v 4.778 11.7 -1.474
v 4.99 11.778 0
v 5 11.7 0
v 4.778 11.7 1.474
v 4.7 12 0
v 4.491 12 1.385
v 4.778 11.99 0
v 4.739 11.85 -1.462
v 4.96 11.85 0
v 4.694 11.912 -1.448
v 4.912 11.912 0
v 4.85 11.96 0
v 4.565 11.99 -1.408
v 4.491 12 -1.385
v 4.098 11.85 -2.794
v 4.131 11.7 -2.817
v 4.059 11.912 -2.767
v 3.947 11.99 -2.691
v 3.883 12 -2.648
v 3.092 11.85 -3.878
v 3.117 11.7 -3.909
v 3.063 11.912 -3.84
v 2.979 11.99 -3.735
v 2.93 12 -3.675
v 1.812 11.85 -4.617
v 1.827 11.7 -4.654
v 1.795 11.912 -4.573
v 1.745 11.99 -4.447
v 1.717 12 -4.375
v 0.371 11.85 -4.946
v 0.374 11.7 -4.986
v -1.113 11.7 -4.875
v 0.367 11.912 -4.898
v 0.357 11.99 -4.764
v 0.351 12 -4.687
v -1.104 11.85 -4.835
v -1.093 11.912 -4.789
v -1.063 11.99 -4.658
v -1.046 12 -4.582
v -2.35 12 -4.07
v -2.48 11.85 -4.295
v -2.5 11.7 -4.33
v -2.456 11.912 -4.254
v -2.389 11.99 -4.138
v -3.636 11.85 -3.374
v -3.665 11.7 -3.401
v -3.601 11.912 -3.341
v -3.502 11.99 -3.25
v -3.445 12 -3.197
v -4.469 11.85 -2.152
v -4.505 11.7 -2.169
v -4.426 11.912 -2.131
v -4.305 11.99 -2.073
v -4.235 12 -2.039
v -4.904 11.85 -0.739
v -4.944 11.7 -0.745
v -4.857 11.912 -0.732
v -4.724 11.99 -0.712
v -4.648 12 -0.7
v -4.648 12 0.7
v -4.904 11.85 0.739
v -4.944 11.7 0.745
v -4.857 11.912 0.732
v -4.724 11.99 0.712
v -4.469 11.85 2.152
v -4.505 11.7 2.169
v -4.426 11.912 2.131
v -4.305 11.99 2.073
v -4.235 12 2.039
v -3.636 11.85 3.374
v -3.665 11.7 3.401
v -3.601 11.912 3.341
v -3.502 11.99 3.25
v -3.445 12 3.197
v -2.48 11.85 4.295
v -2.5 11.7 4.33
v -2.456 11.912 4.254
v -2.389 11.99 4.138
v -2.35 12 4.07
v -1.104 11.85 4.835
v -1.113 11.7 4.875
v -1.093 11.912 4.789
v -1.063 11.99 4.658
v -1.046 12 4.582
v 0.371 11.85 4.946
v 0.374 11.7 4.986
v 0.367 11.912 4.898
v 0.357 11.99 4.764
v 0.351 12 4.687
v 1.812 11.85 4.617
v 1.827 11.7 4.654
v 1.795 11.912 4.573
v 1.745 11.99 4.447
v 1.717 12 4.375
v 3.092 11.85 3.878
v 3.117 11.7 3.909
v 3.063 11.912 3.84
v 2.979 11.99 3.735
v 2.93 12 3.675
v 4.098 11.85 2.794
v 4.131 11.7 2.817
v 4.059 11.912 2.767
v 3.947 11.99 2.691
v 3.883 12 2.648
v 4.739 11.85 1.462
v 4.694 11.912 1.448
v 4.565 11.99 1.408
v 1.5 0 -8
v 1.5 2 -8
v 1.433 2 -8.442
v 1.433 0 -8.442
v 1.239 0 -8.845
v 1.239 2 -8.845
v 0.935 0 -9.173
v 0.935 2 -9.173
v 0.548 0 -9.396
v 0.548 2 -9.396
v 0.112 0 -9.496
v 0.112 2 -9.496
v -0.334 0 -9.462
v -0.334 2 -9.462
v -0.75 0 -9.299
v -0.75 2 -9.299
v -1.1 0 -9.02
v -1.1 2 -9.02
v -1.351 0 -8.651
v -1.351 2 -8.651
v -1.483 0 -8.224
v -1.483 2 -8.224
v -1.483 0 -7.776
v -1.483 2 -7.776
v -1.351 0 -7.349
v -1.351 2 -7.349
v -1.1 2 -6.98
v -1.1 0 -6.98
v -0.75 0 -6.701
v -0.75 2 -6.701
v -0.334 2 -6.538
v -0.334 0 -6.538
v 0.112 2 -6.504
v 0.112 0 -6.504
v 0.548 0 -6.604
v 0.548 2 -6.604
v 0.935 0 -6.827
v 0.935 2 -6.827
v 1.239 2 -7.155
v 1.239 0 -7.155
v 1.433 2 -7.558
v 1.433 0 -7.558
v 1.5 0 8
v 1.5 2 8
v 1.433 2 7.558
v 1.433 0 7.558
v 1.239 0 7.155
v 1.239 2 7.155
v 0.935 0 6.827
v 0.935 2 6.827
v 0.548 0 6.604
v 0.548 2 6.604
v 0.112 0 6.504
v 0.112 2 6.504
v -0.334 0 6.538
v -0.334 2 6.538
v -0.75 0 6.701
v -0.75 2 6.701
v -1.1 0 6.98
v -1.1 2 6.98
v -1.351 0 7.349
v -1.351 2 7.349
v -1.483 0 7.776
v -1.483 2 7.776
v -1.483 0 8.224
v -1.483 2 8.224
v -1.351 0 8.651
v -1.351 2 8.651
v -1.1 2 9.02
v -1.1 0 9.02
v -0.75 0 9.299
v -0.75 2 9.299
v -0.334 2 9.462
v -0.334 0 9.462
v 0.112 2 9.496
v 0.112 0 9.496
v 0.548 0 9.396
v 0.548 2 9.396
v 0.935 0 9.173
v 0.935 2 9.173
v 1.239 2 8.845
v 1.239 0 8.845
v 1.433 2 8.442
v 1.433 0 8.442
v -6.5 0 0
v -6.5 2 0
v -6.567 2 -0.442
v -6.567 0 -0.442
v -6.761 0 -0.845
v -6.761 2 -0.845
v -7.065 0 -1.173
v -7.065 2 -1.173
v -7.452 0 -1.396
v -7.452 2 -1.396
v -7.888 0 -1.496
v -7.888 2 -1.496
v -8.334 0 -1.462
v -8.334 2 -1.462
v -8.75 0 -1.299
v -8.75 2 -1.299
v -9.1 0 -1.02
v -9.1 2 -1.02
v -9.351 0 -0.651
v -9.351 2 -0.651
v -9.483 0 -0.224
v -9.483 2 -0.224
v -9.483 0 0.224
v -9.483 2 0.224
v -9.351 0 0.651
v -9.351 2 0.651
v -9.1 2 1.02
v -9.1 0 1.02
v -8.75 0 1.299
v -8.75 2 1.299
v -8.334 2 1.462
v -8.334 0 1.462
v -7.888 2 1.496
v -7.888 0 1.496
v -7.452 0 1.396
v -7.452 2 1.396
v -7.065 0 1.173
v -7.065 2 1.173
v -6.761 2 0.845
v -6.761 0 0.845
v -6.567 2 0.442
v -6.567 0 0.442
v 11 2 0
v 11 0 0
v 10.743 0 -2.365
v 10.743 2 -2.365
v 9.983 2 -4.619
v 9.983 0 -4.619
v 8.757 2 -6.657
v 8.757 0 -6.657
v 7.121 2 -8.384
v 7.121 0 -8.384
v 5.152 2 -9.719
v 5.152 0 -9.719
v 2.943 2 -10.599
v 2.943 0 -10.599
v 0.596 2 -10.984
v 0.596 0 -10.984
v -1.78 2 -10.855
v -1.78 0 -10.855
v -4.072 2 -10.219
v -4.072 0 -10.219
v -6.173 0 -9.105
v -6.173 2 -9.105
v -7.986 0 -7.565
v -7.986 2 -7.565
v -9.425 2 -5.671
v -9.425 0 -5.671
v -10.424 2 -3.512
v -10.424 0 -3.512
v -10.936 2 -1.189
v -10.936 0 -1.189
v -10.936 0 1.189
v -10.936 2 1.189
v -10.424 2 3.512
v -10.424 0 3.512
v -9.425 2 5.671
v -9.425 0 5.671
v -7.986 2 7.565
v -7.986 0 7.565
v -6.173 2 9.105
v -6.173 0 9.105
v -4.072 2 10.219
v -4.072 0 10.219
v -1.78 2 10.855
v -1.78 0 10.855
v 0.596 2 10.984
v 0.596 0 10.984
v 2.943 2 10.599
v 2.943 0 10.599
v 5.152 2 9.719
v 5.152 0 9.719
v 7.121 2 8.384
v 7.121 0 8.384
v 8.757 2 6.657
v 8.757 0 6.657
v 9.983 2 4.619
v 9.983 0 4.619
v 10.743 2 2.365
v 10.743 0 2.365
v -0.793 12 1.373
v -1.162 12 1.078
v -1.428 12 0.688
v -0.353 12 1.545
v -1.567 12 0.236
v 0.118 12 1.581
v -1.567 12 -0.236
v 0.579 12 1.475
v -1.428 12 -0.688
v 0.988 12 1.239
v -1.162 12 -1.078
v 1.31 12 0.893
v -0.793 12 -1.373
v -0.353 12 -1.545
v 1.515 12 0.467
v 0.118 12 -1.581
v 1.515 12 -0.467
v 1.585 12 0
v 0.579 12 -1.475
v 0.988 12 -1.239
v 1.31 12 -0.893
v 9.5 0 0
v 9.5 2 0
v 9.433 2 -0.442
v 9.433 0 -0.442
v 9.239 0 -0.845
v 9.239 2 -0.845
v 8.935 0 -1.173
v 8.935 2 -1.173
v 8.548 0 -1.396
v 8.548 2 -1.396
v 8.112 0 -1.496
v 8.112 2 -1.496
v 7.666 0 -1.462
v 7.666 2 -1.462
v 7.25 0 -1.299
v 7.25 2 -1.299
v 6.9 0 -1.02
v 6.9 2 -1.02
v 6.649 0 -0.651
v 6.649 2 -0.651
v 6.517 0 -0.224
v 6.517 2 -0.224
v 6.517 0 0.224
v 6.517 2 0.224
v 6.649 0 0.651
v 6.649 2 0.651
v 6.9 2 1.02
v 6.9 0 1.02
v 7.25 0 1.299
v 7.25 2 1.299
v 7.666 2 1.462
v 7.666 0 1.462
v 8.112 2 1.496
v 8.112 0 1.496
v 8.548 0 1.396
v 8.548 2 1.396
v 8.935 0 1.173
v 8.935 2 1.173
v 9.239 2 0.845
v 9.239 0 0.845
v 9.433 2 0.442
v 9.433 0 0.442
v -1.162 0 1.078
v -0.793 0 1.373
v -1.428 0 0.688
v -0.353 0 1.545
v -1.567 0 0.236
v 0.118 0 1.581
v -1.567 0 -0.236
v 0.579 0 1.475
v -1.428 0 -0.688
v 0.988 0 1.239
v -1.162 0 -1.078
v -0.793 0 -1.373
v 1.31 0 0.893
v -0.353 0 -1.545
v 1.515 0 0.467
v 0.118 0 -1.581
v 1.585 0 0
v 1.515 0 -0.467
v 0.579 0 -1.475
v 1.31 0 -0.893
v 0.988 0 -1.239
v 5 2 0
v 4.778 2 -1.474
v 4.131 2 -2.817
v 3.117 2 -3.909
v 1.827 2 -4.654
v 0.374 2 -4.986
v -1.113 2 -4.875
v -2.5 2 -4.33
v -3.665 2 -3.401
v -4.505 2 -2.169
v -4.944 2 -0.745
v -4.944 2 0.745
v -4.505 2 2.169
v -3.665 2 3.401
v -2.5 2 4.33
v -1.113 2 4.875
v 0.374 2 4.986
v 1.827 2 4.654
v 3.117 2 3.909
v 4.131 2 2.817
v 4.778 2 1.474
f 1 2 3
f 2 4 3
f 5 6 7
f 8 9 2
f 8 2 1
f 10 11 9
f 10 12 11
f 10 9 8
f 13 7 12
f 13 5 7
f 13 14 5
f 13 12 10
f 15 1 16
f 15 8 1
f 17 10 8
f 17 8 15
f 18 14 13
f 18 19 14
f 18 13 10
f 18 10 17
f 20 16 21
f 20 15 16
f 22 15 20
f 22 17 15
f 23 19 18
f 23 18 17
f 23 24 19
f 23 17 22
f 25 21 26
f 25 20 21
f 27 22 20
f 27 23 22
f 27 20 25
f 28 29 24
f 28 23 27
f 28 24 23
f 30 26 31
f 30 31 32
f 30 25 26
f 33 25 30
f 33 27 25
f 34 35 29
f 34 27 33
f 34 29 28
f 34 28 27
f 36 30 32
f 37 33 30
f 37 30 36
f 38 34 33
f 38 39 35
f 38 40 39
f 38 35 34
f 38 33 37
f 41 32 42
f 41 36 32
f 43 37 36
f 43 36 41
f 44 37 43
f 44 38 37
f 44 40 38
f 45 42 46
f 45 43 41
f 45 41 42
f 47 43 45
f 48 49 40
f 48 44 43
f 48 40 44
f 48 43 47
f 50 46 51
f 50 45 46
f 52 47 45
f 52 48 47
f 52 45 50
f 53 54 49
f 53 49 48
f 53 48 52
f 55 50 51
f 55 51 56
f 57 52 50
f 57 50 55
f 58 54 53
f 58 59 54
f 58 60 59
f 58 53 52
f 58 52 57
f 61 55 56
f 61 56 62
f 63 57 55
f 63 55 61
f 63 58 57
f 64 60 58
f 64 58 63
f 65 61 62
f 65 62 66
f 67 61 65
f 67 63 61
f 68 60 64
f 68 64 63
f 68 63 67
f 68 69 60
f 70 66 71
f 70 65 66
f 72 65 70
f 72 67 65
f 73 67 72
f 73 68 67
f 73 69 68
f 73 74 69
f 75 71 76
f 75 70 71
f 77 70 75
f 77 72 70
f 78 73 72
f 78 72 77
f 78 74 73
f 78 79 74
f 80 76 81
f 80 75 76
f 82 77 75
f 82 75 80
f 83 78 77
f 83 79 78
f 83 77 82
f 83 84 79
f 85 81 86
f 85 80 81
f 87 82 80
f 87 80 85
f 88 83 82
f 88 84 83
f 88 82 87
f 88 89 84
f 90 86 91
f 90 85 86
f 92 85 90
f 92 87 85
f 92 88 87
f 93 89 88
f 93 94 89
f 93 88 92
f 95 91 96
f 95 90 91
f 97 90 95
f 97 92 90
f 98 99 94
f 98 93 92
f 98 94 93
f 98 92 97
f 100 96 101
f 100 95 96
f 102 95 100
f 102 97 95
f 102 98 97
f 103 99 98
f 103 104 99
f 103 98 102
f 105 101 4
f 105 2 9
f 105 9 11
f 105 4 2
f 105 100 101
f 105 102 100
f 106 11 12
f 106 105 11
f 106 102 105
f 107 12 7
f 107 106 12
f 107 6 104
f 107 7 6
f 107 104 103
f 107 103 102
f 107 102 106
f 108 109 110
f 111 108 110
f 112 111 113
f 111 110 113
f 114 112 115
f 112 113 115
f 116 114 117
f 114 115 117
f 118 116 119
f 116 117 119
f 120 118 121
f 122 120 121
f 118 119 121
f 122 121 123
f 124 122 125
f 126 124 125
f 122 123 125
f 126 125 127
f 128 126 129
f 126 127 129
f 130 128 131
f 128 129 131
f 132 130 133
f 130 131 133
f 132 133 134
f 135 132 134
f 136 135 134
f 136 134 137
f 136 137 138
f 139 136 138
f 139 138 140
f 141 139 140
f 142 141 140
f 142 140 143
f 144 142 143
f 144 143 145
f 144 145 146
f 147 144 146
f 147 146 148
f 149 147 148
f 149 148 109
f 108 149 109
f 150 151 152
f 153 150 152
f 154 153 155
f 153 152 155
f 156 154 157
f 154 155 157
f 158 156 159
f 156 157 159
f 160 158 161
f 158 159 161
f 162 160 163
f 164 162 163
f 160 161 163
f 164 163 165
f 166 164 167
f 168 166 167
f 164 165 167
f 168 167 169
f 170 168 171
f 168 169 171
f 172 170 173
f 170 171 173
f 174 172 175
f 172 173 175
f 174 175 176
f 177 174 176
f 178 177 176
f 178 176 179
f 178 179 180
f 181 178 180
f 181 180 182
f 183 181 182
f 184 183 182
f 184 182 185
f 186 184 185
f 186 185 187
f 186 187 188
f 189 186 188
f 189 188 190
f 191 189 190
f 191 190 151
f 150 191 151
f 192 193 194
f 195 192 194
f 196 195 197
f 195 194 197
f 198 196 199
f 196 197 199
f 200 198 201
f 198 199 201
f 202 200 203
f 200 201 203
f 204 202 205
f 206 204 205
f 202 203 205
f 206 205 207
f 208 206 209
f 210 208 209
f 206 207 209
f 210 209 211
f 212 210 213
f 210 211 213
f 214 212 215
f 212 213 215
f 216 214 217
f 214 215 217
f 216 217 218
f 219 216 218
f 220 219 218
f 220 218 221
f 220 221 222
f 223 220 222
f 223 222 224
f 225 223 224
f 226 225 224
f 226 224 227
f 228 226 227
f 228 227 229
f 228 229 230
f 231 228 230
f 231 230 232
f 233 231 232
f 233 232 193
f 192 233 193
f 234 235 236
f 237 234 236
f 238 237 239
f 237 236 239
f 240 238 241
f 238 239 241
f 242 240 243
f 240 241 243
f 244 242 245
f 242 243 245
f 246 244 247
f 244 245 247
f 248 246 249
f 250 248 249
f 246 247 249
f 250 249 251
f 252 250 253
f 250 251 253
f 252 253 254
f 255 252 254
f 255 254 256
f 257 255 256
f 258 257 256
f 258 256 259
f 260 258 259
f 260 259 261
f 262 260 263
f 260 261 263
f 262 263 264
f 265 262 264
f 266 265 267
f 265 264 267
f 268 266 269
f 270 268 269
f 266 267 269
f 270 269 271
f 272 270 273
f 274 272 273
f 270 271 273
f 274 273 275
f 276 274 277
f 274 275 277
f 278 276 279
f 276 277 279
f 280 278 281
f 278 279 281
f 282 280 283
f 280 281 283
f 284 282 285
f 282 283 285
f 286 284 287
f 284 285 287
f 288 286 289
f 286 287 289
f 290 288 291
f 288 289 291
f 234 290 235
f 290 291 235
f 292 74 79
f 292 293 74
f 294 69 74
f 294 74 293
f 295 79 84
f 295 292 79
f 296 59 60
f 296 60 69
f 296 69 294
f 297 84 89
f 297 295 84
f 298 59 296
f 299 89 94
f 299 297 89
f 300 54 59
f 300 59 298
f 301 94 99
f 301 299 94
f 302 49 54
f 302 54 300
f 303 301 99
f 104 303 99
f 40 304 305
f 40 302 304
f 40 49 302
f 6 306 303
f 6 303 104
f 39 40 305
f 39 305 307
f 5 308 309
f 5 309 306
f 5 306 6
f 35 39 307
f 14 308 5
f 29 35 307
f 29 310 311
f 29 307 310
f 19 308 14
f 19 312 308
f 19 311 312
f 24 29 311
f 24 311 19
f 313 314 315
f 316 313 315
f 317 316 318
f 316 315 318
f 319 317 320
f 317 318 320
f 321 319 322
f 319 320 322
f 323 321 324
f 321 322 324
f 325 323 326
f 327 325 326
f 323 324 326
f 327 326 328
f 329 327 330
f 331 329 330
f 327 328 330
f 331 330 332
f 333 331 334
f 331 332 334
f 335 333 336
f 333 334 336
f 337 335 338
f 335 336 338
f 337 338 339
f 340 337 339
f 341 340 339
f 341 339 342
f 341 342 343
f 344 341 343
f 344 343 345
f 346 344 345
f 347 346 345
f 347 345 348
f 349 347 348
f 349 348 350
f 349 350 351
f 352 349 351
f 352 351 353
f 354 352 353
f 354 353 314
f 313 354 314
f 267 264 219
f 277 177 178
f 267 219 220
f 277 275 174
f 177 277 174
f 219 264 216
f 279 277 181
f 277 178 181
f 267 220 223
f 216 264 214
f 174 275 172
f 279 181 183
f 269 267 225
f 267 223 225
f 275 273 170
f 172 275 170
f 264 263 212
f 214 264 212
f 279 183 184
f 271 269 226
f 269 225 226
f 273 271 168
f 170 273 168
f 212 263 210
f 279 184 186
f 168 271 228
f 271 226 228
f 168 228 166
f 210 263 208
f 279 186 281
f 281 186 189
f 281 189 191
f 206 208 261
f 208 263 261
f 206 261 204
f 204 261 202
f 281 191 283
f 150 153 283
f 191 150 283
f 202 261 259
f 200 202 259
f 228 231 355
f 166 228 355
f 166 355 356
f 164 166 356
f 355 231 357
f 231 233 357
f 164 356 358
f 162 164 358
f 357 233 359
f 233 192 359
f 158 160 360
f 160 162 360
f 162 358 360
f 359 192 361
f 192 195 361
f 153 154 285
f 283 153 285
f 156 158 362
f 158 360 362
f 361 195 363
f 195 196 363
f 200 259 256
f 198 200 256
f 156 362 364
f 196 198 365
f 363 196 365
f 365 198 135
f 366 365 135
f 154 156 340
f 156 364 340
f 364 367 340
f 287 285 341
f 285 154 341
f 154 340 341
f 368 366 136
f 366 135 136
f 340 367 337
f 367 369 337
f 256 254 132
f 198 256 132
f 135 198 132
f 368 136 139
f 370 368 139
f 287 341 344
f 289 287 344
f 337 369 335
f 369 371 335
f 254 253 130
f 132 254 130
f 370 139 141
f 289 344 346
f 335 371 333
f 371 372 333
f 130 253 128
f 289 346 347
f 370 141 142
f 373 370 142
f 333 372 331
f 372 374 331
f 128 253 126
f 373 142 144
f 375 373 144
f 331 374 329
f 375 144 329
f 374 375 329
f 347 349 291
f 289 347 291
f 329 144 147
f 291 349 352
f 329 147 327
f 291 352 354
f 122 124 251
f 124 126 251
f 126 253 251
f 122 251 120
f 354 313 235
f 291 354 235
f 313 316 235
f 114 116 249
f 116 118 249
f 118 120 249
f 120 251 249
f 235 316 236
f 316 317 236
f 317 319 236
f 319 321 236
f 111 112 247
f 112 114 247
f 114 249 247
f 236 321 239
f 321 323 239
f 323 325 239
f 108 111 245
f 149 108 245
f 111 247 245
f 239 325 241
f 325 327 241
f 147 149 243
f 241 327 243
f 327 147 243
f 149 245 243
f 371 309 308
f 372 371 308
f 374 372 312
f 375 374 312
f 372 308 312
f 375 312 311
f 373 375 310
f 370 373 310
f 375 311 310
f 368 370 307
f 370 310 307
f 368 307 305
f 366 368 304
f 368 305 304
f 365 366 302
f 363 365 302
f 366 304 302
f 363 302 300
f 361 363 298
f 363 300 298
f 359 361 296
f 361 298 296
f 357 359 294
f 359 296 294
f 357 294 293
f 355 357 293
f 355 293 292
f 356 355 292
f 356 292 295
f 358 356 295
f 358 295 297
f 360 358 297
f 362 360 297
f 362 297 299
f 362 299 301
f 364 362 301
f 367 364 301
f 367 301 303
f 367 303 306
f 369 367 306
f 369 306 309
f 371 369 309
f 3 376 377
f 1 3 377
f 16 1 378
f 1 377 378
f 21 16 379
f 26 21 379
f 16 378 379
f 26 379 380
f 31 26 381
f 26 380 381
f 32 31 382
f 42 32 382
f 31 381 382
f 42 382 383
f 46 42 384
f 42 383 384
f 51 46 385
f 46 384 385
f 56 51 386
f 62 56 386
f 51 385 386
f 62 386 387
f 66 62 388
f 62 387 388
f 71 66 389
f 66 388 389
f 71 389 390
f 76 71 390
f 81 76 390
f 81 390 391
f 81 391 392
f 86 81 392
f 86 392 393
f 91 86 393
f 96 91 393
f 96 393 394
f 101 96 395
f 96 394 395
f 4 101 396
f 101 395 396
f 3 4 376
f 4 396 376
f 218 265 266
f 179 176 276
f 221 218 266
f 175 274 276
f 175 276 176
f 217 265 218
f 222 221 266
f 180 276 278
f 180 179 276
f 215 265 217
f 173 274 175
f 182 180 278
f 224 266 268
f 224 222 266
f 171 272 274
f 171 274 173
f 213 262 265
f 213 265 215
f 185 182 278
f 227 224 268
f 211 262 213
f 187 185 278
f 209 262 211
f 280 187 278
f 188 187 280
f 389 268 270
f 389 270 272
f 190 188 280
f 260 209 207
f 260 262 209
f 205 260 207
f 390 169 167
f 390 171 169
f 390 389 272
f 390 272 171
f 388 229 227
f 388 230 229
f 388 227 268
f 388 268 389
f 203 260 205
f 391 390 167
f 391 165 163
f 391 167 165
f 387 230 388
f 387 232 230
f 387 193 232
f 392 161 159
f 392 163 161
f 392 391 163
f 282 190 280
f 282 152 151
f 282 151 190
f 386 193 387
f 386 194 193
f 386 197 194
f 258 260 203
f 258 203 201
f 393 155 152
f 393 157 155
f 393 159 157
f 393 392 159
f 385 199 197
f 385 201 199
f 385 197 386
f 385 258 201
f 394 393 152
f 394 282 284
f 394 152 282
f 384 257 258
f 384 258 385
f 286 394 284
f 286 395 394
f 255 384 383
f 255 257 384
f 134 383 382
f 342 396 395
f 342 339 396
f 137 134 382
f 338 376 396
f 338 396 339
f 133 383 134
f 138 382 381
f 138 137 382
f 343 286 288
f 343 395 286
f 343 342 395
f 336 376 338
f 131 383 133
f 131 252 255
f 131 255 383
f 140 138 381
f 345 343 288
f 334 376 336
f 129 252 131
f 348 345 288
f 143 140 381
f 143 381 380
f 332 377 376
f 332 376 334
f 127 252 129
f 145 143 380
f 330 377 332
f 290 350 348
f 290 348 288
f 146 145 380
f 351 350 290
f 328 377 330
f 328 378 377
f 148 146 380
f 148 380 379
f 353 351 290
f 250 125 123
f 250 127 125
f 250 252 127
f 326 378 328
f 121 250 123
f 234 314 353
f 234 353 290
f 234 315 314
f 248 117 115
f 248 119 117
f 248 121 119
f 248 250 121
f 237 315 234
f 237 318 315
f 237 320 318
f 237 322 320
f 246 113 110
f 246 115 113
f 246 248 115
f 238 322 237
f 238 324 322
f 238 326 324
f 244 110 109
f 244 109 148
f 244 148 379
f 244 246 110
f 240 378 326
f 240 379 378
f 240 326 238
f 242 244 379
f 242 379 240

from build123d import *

# Parameters (mm, degrees)
SKETCH1_R           = 11
BOSS_EXTRUDE1_DEPTH = 2
SKETCH2_R           = 5
BOSS_EXTRUDE2_DEPTH = 10
FILLET1_R           = 0.3
SKETCH3_R           = 1.5
CUT_EXTRUDE1_DEPTH  = 10
SKETCH4_R           = 1.585
CUT_EXTRUDE2_DEPTH  = 20


with BuildPart() as part:
    # Sketch1 → Boss-Extrude1 (new body)
    with BuildSketch(Plane(origin=(0, 0, 0), x_dir=(1, 0, 0), z_dir=(0, 1, 0))):
        Circle(SKETCH1_R)
    extrude(amount=BOSS_EXTRUDE1_DEPTH)

    # Sketch2 → Boss-Extrude2 (add)
    with BuildSketch(Plane(origin=(0, 2, 0), x_dir=(1, 0, 0), z_dir=(0, 1, 0))):
        Circle(SKETCH2_R)
    extrude(amount=BOSS_EXTRUDE2_DEPTH)

    # Fillet1
    fillet1_edges = [part.edges().sort_by_distance(p)[0] for p in [
        (-5, 12, 0),
    ]]
    fillet(fillet1_edges, radius=FILLET1_R)

    # Sketch3 → Cut-Extrude1 (cut)
    with BuildSketch(Plane(origin=(0, 2, 0), x_dir=(1, 0, 0), z_dir=(0, 1, 0))):
        with Locations((0, 8)):
            Circle(SKETCH3_R)
        with Locations((8, 0)):
            Circle(SKETCH3_R)
        with Locations((0, -8)):
            Circle(SKETCH3_R)
        with Locations((-8, 0)):
            Circle(SKETCH3_R)
    extrude(amount=-CUT_EXTRUDE1_DEPTH, mode=Mode.SUBTRACT)

    # Sketch4 → Cut-Extrude2 (cut)
    with BuildSketch(Plane(origin=(0, 12, 0), x_dir=(1, 0, 0), z_dir=(0, 1, 0))):
        Circle(SKETCH4_R)
    extrude(amount=-CUT_EXTRUDE2_DEPTH, mode=Mode.SUBTRACT)


solid = part.part
